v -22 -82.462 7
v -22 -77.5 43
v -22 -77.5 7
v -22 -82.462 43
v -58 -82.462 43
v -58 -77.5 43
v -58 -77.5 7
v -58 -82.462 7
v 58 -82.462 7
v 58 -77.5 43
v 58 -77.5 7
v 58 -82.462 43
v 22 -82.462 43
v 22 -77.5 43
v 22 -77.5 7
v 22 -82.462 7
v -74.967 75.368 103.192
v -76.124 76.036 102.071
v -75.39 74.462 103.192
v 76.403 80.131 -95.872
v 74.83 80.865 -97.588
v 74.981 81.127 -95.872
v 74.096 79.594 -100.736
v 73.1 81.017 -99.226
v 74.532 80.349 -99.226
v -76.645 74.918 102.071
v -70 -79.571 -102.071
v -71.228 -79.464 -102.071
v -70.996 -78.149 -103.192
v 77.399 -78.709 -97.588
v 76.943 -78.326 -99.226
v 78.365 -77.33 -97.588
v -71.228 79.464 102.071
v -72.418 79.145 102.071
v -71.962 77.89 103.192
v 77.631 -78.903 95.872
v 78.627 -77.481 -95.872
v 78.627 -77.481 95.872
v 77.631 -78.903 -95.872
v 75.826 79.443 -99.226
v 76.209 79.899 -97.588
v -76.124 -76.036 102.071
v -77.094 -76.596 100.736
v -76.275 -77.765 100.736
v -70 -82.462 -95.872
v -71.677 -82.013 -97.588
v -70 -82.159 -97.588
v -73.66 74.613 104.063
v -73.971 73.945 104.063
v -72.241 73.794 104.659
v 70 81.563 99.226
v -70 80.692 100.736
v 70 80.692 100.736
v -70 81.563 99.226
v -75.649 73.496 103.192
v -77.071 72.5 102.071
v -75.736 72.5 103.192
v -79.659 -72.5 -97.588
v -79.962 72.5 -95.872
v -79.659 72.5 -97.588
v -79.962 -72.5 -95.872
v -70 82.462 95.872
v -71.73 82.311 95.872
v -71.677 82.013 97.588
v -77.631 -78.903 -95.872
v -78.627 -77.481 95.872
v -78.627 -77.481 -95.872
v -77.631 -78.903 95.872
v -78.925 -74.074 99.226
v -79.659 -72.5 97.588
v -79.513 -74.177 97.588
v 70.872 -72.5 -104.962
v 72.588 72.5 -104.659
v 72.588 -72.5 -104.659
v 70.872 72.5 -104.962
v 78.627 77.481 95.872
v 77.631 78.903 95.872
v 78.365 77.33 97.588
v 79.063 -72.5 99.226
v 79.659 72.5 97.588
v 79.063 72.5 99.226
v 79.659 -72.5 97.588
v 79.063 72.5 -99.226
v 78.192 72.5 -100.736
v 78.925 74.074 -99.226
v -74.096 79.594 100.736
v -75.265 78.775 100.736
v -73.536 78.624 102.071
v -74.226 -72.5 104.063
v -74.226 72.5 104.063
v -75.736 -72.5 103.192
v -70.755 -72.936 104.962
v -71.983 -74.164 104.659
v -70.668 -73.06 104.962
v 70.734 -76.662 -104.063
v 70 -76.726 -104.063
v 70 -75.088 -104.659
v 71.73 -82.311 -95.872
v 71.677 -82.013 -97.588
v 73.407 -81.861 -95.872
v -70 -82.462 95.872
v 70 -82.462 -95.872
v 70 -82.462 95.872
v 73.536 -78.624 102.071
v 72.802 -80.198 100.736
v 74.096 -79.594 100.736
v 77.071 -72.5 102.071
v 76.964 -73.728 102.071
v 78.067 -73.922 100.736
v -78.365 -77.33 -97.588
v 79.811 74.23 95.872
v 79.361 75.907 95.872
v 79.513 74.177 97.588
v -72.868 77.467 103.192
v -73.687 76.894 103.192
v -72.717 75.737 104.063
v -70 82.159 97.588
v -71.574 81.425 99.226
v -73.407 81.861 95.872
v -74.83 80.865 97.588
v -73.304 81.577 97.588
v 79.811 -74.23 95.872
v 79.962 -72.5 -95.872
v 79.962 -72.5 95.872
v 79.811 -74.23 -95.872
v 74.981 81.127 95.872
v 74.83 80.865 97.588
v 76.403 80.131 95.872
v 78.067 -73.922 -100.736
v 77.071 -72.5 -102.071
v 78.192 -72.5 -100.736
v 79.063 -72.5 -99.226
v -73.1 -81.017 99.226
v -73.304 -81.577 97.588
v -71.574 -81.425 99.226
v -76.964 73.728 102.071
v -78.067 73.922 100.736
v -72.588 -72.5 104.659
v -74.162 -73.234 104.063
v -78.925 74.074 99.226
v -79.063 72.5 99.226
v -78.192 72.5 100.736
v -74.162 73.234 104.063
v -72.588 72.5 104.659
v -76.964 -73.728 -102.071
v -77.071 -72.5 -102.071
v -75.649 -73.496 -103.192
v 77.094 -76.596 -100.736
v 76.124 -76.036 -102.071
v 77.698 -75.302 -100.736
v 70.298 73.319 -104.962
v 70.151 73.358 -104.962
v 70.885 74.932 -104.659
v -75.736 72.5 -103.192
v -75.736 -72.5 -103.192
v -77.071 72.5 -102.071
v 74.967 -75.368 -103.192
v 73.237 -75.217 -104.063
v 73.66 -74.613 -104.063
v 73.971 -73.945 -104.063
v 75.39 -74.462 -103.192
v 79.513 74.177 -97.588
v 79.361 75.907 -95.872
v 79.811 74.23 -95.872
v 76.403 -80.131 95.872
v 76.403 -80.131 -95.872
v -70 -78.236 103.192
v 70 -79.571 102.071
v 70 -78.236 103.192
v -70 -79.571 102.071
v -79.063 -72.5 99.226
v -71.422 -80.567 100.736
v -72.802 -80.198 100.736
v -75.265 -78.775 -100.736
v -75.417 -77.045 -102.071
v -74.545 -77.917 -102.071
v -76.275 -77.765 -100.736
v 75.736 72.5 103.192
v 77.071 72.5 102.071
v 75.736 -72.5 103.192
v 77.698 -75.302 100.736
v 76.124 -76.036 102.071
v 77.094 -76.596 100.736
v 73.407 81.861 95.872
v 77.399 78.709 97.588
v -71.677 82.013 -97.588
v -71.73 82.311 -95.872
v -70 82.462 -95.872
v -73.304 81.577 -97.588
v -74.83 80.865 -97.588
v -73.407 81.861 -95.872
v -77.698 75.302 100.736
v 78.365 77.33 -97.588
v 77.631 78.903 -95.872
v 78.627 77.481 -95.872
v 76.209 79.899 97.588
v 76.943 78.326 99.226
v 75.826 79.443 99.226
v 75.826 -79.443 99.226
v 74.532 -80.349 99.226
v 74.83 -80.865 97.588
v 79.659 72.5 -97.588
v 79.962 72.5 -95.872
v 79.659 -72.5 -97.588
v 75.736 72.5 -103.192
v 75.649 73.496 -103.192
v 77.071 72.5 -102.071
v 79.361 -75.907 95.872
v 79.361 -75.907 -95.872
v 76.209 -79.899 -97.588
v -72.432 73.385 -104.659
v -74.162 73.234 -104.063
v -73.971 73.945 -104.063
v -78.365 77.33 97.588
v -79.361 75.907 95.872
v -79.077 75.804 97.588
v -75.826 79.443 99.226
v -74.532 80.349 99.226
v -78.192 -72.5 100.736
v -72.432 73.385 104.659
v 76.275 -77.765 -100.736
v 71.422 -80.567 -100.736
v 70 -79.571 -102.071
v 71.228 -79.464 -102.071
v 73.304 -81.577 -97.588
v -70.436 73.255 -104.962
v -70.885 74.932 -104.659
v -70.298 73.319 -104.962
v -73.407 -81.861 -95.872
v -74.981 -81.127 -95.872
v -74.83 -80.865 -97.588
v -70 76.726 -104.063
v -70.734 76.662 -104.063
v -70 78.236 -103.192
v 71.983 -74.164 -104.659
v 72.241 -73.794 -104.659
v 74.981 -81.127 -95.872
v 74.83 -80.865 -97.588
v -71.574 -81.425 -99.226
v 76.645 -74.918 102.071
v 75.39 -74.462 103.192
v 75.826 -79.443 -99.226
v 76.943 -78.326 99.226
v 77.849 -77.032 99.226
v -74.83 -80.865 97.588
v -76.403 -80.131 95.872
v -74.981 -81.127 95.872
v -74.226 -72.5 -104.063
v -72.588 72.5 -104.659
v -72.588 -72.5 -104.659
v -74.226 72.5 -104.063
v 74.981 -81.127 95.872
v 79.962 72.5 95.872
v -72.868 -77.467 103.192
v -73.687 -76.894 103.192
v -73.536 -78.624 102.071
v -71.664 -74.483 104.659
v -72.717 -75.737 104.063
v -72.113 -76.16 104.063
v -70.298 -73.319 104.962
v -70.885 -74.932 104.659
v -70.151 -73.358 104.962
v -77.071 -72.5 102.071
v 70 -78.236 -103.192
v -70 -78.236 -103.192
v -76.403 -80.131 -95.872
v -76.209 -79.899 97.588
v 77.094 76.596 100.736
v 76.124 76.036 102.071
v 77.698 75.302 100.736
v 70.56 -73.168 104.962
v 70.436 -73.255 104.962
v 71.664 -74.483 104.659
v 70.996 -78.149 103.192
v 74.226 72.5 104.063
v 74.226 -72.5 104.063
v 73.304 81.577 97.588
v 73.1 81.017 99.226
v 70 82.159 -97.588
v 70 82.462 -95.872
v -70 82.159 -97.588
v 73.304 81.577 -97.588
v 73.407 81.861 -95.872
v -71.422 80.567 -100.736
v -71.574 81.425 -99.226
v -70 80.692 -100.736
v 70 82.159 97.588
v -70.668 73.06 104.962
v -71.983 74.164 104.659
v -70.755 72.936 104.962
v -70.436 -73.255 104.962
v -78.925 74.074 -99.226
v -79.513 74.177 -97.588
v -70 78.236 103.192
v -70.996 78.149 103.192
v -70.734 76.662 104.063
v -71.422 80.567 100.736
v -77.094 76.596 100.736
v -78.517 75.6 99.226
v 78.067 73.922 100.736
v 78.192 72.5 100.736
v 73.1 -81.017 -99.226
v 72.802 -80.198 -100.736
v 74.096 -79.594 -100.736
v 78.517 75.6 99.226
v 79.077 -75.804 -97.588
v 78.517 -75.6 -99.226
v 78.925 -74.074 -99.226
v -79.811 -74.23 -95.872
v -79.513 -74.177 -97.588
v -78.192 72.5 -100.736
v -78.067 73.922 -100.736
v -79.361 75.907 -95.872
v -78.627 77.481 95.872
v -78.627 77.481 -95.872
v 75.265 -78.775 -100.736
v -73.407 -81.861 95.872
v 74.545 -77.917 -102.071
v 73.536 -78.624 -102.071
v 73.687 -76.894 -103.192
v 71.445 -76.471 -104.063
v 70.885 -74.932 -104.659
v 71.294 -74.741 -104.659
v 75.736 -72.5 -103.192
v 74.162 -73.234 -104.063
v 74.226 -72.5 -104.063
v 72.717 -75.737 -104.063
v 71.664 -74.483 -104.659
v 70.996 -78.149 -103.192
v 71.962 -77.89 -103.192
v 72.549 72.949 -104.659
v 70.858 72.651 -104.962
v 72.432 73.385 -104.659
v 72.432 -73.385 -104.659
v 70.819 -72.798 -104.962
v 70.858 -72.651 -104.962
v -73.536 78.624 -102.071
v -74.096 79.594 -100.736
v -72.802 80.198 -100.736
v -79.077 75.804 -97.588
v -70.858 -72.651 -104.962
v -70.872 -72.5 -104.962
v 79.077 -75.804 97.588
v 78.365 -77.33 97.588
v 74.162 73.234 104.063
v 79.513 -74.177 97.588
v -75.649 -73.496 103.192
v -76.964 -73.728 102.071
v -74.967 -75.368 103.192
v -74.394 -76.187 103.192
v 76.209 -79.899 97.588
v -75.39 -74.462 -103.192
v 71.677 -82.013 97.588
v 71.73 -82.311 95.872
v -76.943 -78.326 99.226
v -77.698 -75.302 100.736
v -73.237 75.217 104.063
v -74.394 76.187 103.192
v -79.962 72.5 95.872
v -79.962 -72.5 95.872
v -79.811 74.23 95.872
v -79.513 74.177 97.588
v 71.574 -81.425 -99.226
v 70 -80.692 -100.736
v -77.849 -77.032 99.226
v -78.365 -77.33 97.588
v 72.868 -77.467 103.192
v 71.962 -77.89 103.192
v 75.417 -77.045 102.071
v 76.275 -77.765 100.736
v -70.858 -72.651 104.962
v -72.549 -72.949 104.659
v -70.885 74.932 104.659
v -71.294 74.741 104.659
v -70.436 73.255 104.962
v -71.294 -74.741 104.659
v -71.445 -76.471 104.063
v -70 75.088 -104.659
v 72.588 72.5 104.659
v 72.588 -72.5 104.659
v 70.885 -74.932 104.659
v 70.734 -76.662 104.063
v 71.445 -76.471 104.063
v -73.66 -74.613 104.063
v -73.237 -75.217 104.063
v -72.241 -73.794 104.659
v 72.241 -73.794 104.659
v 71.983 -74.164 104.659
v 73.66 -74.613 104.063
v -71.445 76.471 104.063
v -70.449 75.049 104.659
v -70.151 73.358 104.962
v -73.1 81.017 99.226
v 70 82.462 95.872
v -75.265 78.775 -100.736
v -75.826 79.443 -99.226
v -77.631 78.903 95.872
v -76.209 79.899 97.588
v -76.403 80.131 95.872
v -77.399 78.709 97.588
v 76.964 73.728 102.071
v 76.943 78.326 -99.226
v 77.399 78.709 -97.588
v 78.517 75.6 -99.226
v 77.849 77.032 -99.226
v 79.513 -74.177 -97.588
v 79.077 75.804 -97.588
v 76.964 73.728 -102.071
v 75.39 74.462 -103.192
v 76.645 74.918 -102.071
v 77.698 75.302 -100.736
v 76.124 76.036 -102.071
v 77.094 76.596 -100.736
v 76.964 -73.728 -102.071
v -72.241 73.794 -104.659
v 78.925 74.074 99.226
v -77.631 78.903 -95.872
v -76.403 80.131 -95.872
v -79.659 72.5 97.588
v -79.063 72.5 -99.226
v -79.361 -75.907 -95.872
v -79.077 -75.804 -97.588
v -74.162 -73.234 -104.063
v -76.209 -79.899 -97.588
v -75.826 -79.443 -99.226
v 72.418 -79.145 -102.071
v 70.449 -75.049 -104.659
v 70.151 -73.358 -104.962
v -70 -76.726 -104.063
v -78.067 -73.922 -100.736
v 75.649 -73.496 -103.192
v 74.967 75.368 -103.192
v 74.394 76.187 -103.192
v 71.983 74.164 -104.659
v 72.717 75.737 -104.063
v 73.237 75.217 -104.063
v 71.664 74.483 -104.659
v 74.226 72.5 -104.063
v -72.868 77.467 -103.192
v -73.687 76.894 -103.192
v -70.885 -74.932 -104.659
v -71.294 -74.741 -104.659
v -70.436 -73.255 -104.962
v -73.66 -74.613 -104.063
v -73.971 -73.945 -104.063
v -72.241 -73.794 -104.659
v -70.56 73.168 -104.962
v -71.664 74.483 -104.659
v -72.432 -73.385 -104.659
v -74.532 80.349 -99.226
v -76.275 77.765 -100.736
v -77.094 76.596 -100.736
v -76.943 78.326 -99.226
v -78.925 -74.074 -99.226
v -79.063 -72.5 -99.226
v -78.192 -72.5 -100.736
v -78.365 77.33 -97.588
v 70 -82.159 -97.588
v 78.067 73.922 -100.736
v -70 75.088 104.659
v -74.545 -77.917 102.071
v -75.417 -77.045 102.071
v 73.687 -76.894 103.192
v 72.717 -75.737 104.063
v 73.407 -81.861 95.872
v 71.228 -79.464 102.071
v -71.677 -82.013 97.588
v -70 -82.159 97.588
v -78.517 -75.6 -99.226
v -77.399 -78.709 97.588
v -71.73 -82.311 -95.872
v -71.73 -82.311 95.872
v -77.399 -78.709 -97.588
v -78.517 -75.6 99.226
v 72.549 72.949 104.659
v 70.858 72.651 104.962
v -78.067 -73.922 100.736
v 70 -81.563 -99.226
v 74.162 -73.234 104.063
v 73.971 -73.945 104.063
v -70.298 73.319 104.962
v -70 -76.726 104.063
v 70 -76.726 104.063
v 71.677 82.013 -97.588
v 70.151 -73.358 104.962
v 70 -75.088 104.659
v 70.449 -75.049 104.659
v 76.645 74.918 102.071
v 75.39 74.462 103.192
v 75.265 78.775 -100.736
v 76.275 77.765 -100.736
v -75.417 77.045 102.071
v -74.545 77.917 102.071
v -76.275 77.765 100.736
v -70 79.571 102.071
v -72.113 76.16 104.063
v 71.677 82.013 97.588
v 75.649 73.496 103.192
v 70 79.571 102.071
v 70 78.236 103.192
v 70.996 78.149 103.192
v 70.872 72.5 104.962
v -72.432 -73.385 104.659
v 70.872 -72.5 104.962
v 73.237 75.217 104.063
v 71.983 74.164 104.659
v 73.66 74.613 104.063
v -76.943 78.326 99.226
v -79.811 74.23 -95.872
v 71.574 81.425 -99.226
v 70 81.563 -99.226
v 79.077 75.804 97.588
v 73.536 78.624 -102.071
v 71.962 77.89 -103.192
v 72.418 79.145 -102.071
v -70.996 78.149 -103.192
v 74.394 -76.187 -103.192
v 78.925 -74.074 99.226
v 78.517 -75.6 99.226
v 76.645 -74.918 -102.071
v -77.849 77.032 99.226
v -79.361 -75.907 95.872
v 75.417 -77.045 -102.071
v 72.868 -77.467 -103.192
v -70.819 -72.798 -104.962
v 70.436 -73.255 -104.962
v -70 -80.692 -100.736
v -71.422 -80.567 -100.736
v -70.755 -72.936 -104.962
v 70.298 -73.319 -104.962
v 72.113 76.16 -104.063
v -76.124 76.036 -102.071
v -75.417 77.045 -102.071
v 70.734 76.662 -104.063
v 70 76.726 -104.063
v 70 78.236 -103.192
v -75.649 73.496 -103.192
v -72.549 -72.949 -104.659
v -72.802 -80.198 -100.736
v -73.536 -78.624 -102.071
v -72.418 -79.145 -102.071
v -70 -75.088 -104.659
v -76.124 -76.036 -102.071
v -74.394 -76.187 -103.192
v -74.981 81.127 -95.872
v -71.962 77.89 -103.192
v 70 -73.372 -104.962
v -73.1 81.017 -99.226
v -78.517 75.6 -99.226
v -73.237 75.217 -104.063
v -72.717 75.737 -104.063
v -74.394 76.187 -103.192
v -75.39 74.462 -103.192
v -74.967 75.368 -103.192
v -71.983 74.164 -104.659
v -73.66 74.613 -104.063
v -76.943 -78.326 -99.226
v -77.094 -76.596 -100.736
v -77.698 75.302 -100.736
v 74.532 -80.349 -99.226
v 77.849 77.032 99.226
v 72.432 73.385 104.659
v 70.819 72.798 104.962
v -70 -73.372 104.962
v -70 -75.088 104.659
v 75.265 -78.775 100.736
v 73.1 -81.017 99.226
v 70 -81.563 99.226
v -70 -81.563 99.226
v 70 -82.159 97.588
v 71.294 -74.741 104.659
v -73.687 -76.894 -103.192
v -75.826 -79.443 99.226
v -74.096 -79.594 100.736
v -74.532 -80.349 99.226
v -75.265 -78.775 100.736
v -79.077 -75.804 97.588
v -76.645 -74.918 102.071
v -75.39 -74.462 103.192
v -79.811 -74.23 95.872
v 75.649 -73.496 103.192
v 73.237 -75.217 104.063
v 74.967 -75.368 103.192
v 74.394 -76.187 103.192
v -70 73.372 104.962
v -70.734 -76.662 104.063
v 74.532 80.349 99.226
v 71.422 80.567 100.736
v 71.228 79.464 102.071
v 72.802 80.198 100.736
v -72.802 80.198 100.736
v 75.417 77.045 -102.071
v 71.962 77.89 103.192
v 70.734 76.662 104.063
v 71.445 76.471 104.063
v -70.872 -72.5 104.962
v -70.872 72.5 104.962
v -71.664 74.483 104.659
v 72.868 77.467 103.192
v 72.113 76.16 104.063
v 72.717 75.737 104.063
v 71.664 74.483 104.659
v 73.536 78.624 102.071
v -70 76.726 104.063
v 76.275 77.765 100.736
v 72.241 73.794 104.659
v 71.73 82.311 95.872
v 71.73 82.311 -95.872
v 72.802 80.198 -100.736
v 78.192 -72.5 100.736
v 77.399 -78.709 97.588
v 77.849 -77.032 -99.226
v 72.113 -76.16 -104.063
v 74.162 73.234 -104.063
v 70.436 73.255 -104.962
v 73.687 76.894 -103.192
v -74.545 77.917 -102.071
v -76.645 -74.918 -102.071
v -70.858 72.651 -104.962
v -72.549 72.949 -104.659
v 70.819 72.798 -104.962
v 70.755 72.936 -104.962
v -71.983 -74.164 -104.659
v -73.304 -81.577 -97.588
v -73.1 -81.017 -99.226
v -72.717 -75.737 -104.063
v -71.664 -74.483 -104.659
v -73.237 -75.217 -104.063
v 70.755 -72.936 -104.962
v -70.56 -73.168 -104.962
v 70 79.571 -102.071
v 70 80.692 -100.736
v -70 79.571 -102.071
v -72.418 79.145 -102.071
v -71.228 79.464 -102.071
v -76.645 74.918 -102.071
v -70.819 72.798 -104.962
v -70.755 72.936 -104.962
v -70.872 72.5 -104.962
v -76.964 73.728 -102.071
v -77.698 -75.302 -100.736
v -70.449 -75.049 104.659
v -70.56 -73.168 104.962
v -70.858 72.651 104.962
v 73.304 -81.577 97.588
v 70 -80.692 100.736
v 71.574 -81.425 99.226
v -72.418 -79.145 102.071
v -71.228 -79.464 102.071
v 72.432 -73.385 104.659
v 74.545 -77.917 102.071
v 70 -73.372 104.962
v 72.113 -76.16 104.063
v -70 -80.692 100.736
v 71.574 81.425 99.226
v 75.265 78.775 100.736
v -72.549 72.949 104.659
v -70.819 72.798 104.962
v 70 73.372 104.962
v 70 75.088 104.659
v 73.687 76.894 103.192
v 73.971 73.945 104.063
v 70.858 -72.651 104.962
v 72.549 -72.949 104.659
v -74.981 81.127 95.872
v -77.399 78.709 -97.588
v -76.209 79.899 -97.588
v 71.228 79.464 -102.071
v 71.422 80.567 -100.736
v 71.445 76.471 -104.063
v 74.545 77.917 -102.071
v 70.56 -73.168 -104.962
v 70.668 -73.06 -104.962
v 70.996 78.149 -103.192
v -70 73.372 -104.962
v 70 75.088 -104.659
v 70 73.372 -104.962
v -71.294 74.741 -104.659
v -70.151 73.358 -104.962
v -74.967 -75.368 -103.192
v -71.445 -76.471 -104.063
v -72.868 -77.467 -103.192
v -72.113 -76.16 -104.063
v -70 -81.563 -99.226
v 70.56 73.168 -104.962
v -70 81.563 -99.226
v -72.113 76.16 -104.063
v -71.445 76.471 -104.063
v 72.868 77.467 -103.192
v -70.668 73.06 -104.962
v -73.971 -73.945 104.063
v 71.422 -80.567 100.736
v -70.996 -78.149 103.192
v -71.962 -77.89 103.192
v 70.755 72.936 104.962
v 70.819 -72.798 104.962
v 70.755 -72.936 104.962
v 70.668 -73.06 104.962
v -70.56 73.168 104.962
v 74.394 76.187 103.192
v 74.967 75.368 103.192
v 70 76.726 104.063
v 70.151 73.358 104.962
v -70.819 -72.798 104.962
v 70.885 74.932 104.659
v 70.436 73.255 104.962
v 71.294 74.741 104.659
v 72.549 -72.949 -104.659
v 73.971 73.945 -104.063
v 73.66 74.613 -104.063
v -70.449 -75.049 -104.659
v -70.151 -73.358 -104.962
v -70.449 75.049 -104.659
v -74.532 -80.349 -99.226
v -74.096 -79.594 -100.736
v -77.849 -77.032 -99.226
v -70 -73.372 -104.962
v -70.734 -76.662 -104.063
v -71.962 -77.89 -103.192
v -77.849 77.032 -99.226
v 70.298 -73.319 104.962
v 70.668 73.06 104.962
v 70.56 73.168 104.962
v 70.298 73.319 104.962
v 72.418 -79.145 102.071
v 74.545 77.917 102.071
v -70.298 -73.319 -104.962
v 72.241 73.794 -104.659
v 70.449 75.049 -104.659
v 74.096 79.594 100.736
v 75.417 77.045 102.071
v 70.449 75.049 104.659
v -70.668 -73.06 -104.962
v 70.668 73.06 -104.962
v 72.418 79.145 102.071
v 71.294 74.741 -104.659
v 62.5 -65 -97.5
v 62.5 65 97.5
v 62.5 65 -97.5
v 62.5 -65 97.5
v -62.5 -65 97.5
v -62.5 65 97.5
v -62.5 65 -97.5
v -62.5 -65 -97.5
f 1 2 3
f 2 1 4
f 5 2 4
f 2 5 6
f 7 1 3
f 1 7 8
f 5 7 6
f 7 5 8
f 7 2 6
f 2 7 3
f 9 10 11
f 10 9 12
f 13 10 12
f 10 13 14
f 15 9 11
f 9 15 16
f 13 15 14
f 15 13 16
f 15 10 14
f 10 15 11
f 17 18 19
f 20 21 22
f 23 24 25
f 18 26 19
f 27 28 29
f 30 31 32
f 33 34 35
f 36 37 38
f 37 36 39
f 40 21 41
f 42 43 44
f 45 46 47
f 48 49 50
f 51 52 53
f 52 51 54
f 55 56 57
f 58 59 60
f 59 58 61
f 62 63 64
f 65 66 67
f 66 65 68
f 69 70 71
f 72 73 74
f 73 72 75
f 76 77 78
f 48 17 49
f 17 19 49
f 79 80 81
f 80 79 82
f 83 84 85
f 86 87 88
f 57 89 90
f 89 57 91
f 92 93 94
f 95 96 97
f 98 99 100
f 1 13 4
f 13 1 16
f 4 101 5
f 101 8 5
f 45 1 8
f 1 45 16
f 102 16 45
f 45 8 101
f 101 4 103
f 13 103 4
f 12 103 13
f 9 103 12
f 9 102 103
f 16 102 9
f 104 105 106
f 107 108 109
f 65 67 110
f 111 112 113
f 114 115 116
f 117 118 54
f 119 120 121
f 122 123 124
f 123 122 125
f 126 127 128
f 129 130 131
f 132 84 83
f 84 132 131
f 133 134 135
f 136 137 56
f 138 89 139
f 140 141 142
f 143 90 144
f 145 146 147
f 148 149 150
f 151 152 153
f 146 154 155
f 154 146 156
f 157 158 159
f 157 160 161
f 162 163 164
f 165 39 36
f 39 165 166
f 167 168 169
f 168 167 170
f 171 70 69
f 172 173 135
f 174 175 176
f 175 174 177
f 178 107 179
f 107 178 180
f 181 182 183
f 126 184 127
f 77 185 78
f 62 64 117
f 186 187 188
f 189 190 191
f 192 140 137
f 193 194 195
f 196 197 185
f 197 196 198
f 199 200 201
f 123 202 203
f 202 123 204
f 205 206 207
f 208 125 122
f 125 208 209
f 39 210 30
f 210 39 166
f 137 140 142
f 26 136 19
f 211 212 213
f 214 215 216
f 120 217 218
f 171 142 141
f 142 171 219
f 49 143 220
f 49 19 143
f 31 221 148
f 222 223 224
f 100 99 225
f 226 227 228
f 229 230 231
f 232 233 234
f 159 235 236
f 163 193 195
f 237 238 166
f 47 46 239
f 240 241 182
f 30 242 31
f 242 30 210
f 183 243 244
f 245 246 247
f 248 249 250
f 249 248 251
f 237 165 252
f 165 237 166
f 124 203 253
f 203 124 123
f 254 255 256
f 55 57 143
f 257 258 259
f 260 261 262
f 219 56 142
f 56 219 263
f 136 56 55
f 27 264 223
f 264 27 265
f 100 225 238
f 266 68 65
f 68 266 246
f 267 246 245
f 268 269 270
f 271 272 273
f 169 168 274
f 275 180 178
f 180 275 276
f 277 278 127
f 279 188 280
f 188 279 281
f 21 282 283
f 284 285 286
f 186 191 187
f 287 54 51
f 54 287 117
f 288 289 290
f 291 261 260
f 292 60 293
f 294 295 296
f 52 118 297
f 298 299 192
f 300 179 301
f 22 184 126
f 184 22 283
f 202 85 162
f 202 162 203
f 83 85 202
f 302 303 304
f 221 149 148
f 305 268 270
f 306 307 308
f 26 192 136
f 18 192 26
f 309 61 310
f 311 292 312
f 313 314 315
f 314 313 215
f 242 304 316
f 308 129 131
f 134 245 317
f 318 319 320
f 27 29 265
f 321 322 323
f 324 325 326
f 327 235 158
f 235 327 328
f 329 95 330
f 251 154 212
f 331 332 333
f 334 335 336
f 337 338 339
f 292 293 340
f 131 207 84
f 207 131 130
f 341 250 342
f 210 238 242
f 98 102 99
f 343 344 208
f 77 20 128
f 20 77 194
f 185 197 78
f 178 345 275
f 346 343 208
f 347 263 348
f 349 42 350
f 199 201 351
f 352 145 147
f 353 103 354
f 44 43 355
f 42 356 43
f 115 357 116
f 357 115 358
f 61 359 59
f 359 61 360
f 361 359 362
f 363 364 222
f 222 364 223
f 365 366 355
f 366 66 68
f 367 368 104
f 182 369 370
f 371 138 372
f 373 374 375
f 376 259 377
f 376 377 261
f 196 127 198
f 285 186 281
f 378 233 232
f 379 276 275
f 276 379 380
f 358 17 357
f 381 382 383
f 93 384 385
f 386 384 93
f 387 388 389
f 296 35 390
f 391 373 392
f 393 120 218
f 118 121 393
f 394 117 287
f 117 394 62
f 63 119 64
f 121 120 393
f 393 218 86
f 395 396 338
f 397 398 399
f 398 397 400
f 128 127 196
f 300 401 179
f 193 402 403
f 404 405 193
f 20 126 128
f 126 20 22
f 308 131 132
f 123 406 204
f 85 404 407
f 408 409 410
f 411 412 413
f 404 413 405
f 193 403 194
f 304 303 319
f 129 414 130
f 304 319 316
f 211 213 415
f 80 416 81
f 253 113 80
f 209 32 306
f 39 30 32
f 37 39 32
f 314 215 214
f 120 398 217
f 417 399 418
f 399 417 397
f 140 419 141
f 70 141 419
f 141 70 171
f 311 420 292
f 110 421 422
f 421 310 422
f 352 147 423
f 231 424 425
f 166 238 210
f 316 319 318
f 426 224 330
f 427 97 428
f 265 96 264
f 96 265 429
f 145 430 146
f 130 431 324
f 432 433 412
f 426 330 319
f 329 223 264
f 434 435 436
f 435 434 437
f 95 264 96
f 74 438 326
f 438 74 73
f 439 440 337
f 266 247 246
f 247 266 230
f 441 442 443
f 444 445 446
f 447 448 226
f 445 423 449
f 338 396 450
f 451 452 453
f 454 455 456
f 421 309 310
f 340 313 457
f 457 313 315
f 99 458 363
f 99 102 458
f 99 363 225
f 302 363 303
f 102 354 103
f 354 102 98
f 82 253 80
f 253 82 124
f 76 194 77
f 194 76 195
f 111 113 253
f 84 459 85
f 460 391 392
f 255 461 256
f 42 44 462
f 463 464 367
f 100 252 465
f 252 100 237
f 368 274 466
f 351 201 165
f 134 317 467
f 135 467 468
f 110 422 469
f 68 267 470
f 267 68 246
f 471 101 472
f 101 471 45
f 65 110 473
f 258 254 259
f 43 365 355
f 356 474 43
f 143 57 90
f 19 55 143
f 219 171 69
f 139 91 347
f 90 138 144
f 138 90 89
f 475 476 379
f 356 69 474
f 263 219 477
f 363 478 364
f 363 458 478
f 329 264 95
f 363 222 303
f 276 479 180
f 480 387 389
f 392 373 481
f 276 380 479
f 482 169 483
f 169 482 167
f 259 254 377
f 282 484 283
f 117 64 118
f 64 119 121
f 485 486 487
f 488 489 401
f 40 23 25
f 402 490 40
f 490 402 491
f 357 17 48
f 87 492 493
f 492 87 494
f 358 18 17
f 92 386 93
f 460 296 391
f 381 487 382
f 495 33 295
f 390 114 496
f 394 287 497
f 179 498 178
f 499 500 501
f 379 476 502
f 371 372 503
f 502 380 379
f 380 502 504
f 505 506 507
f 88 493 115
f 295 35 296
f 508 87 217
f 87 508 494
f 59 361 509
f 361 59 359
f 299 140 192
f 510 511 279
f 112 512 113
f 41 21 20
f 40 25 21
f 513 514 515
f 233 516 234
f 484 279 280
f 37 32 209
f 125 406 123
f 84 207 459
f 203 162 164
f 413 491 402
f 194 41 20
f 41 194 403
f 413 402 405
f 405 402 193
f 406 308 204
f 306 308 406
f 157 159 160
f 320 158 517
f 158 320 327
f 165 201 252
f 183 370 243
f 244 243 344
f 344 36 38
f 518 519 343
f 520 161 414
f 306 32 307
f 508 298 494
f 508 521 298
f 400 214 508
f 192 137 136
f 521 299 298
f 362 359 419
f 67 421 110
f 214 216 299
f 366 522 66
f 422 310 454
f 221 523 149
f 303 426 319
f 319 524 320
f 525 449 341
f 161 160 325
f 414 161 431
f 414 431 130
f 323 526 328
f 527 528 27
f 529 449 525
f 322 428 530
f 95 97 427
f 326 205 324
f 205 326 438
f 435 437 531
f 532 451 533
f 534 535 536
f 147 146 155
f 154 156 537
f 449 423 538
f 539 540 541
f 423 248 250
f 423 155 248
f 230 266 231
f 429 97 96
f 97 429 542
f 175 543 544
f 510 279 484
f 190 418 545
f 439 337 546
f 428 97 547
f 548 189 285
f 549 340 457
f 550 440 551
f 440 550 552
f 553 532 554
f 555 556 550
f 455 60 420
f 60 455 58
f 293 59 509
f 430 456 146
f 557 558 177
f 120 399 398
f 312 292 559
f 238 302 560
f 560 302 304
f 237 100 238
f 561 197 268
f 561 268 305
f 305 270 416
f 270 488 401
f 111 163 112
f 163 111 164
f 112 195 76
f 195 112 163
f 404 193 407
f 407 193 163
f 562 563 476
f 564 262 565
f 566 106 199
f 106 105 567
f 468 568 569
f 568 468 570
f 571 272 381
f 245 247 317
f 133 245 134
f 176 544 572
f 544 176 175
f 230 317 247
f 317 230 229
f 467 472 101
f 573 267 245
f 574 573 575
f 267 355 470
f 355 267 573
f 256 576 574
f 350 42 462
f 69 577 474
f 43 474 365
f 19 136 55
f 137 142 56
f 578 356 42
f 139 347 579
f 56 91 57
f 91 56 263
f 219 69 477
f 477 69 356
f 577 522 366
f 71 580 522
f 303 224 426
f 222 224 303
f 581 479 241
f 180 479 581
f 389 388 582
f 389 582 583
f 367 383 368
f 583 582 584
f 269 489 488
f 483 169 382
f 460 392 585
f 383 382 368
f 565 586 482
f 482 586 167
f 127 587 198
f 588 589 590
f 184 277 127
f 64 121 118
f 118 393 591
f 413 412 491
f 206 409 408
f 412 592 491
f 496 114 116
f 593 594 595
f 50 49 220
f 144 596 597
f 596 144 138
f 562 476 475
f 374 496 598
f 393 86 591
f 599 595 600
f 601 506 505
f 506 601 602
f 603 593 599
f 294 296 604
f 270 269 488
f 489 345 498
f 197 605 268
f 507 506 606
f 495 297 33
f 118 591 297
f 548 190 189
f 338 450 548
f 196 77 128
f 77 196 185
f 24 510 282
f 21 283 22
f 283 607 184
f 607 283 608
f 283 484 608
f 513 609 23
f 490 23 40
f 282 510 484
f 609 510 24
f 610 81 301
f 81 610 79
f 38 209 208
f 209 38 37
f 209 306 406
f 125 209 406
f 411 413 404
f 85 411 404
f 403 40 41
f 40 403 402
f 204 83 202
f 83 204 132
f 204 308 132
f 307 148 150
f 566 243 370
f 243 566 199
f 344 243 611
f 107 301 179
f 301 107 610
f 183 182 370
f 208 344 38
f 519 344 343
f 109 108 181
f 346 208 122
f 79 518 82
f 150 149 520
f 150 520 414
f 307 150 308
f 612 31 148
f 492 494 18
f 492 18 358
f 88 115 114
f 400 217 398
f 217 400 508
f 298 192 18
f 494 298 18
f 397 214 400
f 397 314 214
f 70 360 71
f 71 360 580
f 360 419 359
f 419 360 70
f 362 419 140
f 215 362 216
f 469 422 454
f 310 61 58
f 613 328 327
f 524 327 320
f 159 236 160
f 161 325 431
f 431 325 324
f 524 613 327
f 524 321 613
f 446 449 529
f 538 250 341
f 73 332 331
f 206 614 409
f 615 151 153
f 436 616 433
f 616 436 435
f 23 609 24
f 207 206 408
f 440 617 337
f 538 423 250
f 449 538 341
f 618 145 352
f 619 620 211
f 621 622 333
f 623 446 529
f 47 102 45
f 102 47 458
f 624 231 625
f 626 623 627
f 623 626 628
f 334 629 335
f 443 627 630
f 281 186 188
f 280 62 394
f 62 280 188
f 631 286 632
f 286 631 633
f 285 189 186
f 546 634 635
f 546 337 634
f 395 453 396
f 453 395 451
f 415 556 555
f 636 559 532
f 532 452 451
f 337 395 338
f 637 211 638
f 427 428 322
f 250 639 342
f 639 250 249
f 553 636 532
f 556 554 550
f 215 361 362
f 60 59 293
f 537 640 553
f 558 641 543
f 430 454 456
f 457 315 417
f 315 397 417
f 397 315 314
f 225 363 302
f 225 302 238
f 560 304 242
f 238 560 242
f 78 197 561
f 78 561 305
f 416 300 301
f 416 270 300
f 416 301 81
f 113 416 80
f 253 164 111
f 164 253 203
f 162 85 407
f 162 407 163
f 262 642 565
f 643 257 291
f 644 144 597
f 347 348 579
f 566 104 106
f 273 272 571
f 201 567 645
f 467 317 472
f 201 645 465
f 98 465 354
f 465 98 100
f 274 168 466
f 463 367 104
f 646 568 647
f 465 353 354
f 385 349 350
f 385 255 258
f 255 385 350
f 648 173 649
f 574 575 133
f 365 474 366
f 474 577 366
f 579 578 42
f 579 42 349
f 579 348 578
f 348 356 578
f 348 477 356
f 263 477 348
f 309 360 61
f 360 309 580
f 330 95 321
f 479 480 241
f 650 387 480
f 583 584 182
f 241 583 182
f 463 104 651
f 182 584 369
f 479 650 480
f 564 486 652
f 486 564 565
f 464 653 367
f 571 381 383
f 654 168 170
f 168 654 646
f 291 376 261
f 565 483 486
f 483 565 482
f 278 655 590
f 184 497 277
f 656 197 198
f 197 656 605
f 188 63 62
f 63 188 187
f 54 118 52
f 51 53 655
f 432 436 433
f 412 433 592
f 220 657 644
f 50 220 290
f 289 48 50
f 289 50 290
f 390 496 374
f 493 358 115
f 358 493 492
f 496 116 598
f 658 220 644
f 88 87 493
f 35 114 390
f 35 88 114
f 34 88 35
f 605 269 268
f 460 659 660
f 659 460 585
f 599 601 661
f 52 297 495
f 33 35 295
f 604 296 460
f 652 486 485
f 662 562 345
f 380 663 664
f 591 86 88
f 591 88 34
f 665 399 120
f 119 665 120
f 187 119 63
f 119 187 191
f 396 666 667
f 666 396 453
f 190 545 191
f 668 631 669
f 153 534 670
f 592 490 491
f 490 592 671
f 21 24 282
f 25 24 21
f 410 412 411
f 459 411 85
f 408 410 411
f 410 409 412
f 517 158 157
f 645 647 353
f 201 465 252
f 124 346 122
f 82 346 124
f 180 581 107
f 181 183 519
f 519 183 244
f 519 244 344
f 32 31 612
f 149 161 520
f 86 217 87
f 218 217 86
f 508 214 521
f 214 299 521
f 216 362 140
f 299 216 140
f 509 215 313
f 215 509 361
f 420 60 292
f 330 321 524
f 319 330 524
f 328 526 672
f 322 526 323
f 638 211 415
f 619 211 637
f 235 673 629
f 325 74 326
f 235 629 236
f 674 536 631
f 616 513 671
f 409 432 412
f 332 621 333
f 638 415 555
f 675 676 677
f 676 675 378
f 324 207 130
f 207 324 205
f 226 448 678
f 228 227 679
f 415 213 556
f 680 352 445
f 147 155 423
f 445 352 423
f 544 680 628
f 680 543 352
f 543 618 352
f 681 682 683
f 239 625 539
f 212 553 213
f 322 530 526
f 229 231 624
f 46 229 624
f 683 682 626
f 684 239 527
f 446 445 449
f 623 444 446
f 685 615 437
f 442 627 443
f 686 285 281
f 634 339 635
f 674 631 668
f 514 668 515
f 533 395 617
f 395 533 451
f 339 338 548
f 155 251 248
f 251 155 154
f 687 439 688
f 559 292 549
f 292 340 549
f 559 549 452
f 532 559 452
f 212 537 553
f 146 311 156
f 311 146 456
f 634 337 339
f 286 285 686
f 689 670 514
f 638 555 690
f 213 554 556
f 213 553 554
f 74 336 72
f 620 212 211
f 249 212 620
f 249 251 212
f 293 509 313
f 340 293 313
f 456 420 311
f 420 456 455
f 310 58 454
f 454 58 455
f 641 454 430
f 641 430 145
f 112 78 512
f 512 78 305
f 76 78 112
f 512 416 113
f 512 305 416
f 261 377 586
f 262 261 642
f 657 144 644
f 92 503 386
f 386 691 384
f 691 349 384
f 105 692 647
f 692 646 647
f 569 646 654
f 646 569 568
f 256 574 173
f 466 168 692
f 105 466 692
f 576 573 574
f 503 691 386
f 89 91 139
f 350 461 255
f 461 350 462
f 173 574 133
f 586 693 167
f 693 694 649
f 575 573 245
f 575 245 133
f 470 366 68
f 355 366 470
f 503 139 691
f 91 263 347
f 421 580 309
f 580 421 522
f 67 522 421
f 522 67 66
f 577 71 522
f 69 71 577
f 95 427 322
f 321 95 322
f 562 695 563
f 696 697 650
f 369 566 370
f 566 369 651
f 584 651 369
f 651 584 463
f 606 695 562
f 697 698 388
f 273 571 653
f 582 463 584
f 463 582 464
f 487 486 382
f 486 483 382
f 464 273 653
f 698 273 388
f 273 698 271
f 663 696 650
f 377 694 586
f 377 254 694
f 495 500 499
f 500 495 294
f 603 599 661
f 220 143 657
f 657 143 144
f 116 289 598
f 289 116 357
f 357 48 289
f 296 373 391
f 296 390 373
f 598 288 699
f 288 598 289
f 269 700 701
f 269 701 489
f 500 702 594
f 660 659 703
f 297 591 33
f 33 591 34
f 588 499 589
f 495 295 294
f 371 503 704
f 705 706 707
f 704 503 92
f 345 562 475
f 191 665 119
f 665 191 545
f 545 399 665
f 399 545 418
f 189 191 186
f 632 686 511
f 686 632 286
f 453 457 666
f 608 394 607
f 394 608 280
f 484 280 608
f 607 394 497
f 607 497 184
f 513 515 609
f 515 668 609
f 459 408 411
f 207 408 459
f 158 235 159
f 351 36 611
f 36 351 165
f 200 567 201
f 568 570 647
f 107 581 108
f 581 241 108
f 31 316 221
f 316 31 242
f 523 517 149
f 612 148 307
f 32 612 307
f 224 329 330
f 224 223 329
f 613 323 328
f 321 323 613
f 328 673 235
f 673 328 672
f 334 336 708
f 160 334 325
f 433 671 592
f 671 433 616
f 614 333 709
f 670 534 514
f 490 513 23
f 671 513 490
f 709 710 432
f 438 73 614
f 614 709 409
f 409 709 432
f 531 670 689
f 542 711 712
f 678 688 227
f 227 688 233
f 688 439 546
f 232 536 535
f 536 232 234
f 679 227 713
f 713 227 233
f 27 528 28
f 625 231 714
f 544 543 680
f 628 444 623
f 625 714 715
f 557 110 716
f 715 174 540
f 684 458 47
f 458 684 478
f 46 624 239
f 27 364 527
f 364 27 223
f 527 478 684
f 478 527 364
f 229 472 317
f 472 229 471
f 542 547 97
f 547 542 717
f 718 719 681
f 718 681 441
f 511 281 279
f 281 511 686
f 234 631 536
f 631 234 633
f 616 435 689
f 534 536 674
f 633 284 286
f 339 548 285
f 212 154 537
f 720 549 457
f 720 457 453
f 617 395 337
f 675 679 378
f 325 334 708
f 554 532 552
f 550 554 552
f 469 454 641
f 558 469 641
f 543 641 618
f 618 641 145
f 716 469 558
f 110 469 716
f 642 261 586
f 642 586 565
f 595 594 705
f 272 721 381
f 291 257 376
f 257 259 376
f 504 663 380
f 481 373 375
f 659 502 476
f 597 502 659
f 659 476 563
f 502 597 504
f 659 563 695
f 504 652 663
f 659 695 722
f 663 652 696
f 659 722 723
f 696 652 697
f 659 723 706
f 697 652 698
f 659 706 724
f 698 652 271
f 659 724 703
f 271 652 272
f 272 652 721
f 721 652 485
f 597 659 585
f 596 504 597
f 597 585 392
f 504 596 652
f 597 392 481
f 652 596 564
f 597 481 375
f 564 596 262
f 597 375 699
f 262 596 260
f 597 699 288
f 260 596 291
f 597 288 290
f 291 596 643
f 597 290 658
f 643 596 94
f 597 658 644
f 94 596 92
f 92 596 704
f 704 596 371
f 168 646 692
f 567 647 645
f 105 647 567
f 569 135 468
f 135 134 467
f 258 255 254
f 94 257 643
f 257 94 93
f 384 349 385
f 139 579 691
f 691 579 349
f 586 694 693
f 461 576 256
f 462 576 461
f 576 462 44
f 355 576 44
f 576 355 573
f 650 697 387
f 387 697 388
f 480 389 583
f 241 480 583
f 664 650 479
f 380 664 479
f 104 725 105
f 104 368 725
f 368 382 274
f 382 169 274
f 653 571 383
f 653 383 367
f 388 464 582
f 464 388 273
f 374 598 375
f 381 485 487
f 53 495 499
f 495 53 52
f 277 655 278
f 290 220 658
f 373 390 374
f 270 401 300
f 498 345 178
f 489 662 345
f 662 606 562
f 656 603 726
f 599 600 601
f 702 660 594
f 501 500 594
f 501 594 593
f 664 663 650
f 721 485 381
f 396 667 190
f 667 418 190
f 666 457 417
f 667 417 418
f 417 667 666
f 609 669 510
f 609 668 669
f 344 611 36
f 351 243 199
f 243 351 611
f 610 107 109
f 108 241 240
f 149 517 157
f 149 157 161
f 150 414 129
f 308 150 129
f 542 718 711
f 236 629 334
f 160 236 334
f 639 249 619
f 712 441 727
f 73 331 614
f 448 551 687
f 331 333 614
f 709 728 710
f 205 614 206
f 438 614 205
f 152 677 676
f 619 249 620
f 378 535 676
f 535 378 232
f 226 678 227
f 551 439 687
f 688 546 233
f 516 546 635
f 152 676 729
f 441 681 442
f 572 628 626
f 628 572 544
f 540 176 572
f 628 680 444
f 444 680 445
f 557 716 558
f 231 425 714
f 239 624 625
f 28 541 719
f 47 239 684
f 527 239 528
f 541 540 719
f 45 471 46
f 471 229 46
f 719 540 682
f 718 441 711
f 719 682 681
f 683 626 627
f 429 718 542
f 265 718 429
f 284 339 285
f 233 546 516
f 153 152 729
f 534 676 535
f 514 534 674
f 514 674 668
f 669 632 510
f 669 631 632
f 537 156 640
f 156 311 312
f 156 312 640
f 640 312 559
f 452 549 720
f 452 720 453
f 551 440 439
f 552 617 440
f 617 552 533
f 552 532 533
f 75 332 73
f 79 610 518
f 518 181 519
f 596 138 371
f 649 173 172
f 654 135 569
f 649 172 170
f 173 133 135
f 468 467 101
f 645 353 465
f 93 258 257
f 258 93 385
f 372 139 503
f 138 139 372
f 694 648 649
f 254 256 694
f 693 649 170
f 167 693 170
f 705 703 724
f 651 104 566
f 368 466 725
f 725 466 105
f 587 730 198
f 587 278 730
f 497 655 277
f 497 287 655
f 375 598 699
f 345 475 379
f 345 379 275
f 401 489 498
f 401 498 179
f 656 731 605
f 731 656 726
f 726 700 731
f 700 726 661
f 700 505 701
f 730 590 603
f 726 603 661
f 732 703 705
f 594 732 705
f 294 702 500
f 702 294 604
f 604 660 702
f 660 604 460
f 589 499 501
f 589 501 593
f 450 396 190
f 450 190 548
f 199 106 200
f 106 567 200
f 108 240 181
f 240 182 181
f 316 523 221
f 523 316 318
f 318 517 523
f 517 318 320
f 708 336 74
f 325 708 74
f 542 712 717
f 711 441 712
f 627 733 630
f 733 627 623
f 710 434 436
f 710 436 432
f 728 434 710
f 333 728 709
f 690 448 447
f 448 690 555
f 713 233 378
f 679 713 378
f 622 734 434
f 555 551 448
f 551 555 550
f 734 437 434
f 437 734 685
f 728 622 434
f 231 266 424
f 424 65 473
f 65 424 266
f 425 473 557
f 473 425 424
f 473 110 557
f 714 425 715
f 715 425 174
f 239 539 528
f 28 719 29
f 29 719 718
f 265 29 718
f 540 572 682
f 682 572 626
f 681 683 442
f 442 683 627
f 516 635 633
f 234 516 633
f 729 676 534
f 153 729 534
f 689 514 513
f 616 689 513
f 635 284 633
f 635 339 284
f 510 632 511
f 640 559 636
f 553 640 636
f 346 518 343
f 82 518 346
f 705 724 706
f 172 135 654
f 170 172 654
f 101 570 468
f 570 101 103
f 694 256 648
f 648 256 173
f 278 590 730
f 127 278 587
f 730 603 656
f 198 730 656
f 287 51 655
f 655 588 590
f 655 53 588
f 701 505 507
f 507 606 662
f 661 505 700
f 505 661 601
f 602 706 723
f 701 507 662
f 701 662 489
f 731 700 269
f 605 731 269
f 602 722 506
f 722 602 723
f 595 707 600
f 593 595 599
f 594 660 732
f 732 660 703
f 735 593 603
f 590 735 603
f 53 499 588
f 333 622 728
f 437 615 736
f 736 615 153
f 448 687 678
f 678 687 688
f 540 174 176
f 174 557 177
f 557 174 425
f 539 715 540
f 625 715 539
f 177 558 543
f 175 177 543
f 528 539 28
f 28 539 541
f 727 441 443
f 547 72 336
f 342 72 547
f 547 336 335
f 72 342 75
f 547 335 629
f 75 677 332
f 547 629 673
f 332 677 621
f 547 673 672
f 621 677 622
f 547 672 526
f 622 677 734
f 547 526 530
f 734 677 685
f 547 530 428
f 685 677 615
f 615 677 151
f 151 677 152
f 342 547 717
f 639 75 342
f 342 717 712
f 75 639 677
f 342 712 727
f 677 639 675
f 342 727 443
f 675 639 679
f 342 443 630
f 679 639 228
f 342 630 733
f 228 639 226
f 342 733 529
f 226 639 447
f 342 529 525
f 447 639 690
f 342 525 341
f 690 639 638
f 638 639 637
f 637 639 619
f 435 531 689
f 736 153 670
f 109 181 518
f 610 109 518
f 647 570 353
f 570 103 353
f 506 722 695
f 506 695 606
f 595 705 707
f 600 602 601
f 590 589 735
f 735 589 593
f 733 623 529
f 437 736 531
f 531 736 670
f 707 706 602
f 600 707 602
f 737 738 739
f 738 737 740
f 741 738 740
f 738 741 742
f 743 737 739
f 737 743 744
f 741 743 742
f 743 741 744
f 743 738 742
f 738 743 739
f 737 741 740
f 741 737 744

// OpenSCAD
// file: ../config.scad
// Shared units: millimeters
$fn = 36;

scale_major = 1.0;
build_plate_mm = 220;
head_width_mm = 160;
head_height_mm = 210;
head_depth_mm = 165;
bearing_clearance_mm = 0.25;
bowden_outer_diameter_mm = 4.0;
eye_display_size_mm = 36;

echo(str("Robot design scale: ", scale_major));
// main file
include <../config.scad>

difference() {
    scale([scale_major, scale_major, scale_major])
        minkowski() {
            cube([head_width_mm - 20, head_depth_mm - 20, head_height_mm - 20], center=true);
            sphere(r=10);
        }

    // Placeholder internal opening for the mechanical gimbal.
    cube([head_width_mm - 35, head_depth_mm - 35, head_height_mm - 15], center=true);

    // Optical window placeholders.
    for (x = [-40, 40])
        translate([x, -head_depth_mm/2 - 1, 25])
            cube([eye_display_size_mm, 12, eye_display_size_mm], center=true);
}
